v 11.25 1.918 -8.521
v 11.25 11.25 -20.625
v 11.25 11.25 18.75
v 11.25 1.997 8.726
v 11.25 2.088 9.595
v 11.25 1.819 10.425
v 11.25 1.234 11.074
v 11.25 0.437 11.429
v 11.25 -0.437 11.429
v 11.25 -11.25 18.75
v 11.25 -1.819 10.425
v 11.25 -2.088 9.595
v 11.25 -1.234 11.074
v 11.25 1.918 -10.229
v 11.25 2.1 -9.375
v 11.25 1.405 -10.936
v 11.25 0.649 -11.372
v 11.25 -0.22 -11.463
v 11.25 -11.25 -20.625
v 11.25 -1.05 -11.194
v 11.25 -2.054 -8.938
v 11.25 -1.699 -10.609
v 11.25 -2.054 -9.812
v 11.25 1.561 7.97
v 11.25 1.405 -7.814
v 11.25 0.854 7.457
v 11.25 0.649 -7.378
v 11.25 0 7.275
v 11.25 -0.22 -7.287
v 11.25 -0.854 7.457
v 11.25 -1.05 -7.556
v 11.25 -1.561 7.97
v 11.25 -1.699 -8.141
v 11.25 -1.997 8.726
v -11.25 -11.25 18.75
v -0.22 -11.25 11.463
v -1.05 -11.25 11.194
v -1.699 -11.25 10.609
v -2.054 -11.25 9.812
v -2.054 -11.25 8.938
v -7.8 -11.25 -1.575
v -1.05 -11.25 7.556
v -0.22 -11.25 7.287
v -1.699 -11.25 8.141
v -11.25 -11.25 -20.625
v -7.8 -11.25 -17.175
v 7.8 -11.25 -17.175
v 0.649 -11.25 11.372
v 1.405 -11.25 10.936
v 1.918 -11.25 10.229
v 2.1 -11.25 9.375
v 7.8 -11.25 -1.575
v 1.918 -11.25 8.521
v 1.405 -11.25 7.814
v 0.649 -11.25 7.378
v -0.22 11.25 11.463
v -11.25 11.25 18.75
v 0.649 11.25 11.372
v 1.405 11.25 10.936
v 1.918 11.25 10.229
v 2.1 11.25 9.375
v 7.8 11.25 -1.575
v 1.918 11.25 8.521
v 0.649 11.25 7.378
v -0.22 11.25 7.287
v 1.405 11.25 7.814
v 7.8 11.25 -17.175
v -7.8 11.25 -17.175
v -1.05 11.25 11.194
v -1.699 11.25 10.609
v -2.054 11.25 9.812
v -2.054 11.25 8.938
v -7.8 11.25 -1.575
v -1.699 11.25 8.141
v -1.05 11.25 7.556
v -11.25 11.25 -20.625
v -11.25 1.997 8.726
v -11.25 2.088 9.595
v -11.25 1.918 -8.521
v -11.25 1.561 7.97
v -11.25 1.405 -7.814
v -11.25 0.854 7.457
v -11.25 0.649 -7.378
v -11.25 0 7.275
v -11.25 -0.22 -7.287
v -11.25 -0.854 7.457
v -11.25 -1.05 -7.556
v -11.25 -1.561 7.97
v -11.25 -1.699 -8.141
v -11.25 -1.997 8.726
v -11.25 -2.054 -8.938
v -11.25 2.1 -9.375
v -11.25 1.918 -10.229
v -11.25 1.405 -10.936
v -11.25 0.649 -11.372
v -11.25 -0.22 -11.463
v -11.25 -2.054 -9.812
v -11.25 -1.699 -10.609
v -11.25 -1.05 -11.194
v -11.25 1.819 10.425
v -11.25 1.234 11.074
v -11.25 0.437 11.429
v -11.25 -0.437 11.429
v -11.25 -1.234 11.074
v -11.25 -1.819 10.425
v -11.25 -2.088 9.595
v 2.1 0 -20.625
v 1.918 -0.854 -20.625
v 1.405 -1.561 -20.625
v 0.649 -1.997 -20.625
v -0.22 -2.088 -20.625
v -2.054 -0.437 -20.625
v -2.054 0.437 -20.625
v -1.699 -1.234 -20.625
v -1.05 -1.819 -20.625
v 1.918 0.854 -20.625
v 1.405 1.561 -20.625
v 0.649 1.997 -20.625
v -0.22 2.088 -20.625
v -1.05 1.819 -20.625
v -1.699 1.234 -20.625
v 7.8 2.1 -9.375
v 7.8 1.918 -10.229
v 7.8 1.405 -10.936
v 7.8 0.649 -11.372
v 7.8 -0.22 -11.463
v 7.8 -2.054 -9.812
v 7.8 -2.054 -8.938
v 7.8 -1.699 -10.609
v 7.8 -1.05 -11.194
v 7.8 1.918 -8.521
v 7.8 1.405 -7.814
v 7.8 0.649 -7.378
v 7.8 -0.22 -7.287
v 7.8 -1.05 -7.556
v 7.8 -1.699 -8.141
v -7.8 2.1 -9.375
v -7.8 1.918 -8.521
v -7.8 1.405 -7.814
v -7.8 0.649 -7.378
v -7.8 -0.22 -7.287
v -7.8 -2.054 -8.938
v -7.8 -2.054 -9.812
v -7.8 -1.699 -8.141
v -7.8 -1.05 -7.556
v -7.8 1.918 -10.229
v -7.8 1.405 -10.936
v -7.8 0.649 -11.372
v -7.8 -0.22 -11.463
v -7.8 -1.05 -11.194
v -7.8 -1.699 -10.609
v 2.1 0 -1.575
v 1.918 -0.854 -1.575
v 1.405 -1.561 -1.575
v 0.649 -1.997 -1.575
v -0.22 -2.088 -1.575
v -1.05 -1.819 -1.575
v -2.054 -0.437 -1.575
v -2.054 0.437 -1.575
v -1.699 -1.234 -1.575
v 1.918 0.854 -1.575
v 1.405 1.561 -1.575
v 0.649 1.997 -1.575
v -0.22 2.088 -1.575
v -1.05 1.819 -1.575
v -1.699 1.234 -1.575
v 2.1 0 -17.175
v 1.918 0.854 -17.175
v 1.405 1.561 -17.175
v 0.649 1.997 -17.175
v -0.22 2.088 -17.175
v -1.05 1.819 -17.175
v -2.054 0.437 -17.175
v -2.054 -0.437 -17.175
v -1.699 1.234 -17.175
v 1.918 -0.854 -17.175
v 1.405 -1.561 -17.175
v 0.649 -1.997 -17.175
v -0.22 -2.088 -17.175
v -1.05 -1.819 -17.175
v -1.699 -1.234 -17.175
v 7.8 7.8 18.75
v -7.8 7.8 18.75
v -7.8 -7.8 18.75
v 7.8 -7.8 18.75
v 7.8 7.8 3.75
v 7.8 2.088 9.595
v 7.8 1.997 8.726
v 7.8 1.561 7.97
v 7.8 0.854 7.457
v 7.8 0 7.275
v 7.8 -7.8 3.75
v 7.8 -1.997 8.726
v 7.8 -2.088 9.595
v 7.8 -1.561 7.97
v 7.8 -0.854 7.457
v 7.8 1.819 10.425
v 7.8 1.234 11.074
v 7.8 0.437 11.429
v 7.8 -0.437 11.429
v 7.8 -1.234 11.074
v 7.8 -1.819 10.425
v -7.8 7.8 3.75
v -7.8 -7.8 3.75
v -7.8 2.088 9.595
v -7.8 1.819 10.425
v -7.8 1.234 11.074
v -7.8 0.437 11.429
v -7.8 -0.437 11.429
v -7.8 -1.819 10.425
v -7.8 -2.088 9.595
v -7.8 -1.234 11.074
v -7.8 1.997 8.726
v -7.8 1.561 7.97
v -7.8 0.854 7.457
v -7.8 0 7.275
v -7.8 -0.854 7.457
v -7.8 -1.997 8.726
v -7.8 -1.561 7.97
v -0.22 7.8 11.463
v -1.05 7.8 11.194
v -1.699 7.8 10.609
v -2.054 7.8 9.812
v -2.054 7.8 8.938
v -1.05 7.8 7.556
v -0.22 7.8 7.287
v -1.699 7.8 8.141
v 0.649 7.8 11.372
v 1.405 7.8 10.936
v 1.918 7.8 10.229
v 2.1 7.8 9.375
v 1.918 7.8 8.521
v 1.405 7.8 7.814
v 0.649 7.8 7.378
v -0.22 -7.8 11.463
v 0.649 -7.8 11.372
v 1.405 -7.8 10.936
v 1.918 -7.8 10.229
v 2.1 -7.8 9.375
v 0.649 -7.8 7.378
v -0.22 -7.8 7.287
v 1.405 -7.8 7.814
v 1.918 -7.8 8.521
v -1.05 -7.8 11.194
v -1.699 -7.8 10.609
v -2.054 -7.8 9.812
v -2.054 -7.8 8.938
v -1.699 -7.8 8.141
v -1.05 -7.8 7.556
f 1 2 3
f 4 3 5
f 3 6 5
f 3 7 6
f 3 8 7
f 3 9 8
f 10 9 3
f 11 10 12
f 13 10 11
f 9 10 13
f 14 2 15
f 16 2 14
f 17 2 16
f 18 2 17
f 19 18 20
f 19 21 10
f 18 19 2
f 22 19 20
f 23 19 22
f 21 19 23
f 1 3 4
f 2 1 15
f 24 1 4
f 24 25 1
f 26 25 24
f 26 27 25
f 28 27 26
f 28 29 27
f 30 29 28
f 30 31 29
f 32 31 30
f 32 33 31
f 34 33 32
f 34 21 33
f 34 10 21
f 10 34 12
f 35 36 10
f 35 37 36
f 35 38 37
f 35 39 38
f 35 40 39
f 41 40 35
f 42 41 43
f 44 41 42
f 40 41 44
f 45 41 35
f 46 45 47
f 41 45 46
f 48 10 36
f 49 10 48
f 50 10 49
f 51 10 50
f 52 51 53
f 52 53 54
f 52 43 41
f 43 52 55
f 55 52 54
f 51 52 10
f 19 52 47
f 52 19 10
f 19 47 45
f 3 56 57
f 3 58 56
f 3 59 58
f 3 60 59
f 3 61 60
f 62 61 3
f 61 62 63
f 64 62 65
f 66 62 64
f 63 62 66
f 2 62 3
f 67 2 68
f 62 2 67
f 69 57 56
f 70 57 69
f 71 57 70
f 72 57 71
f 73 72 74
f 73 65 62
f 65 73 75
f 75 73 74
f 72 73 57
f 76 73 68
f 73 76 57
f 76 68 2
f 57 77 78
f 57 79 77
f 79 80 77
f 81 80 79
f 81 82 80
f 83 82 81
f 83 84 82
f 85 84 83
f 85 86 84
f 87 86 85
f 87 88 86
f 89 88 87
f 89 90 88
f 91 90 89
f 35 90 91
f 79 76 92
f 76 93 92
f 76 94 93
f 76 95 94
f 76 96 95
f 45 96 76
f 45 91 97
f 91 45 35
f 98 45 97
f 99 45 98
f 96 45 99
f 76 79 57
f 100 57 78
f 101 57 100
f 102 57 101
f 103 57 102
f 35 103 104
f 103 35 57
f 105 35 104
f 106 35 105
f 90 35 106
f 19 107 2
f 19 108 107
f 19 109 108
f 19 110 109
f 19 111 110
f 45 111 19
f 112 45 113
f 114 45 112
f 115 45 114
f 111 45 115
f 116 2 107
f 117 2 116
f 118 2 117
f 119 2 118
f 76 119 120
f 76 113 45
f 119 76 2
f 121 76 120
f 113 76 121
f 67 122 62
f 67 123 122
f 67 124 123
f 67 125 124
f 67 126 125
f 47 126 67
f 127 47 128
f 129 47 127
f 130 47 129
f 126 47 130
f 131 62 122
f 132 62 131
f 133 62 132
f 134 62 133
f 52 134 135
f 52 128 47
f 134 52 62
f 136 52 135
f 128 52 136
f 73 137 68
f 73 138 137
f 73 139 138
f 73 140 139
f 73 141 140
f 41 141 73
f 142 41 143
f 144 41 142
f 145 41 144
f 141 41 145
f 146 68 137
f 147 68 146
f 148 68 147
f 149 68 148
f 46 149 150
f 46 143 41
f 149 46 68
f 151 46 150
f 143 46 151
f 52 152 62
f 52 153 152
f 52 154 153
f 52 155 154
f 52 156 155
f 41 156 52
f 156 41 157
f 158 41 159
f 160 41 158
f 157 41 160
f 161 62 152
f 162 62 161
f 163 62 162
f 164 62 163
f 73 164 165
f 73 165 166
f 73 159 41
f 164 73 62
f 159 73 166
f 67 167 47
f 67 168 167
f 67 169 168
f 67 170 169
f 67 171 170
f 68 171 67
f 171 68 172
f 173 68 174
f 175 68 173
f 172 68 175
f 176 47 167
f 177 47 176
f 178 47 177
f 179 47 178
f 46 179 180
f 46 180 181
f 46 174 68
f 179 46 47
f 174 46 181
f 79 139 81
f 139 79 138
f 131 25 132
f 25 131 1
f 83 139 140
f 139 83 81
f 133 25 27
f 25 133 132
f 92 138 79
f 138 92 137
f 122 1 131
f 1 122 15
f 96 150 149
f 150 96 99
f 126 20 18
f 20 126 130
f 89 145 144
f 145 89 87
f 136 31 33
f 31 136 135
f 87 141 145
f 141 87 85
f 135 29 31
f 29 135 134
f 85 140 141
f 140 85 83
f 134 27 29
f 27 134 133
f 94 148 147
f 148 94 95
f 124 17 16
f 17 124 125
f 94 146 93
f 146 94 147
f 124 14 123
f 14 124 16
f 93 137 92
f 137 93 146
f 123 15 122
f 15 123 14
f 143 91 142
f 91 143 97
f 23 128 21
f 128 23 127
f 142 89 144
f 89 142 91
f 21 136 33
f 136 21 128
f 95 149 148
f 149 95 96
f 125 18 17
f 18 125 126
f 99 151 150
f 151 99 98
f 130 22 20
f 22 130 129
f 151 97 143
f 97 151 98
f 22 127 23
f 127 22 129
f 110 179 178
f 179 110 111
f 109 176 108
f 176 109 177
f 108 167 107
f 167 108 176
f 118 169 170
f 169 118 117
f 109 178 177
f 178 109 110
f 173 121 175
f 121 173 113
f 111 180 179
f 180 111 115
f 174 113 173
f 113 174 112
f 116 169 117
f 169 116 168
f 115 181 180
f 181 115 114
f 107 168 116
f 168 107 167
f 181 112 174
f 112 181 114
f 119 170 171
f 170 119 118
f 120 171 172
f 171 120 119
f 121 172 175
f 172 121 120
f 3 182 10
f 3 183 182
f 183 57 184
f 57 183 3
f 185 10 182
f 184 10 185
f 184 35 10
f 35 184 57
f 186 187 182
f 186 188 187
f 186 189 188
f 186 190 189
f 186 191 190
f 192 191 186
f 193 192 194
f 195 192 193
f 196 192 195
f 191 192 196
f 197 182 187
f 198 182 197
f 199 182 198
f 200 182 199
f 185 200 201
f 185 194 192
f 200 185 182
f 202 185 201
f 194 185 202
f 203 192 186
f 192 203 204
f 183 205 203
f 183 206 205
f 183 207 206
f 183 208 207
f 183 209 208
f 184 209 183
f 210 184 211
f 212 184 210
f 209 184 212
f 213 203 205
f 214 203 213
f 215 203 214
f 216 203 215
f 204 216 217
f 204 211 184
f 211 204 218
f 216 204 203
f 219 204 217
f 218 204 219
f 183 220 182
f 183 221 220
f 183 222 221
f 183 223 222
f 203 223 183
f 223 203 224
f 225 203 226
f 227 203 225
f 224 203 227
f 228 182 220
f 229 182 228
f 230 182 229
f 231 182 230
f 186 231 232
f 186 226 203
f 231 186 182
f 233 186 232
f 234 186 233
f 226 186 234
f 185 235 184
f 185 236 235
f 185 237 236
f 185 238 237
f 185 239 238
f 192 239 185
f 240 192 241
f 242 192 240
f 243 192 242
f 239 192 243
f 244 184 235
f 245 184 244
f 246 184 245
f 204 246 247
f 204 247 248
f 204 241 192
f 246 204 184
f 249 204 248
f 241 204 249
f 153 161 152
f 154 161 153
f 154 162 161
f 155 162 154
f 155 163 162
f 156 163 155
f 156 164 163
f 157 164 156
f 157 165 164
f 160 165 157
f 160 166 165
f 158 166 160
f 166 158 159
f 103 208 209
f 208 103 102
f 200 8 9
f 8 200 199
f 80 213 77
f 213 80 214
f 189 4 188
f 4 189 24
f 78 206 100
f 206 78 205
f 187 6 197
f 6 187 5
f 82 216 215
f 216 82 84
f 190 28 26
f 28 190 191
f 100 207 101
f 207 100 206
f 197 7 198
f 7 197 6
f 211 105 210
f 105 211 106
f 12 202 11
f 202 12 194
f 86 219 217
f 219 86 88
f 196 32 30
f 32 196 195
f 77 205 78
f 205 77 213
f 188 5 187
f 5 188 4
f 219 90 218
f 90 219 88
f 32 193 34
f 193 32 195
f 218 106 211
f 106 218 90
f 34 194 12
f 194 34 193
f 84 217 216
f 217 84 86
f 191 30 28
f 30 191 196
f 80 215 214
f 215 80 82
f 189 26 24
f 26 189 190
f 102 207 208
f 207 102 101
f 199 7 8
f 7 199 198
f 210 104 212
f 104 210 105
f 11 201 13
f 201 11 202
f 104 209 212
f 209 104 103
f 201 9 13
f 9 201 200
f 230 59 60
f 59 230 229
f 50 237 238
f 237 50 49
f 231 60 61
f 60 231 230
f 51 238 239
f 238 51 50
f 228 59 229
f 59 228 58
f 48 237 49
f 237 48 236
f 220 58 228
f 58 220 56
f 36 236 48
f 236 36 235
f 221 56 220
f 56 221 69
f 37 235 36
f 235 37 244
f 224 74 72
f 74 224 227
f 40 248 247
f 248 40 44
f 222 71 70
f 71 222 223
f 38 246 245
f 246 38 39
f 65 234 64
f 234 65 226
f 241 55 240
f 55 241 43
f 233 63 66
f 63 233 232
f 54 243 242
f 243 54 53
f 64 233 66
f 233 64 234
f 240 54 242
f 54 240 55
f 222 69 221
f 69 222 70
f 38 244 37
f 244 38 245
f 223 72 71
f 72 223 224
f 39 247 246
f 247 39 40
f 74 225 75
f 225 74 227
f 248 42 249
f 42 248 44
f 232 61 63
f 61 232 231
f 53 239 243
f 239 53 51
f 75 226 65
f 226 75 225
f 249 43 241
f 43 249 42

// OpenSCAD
open_beam = 15; //open beam dimensions (square)
r_corners = 3;
extrusion=0.3;

w_t_mod = 0.5;
beam_width = 15;
slot_depth = 15;
cross_b_length = beam_width+beam_width*w_t_mod ;
//variables for edge fillet
b = 13;
h = 20;
w = 90*0.5888888+r_corners;


//===========================================================================================
//===========================================================================================
module beam_cap(){
	difference(){
		difference(){
			translate([0, 0, beam_width/2])
			cube([beam_width+beam_width*w_t_mod, beam_width+beam_width*w_t_mod, slot_depth+beam_width*w_t_mod], center=true);
			translate([0, 0, (beam_width*w_t_mod+beam_width)/2])
			cube([beam_width+extrusion*2, beam_width+extrusion*2, slot_depth], center=true);

		}
			union(){
				translate([0, 0, -(slot_depth+beam_width*w_t_mod+beam_width)/4])
				rotate([90, 0, 0])
				cube([beam_width+extrusion*2, beam_width+extrusion*2, cross_b_length*2], center=true);
				translate([0, 0, -(slot_depth+beam_width*w_t_mod+beam_width)/4])
				rotate([0, 90, 0])
				cylinder(r=1.5+extrusion*2, h=cross_b_length*2,center = true,  $fn=15);
				translate([0, 0, (slot_depth+beam_width*w_t_mod+beam_width)/4])
				rotate([0, 90, 0])
				cylinder(r=1.5+extrusion*2, h=cross_b_length*2,center = true,  $fn=15);
				translate([0, 0, (slot_depth+beam_width*w_t_mod+beam_width)/4])
				rotate([90, 0, 0])
				cylinder(r=1.5+extrusion*2, h=cross_b_length*2,center = true,  $fn=15);
			}
	}	
}

module cross_beam(){
	difference(){
	difference(){
		cube([beam_width+beam_width*w_t_mod, beam_width+beam_width*w_t_mod, cross_b_length], center=true);
		cube([beam_width+extrusion*2, beam_width+extrusion*2, cross_b_length], center=true);

	}
	rotate([0, 90, 0])
	cylinder(r=1.5+extrusion*2, h=cross_b_length*2,center = true,  $fn=15);
	rotate([90, 0, 0])
	cylinder(r=1.5+extrusion*2, h=cross_b_length*2,center = true,  $fn=15);
	}

}
//cross_beam();

union(){
translate([0, 0, -(slot_depth+beam_width*w_t_mod+beam_width)/4])
rotate([90, 0, 0])
cross_beam();
beam_cap();
}
